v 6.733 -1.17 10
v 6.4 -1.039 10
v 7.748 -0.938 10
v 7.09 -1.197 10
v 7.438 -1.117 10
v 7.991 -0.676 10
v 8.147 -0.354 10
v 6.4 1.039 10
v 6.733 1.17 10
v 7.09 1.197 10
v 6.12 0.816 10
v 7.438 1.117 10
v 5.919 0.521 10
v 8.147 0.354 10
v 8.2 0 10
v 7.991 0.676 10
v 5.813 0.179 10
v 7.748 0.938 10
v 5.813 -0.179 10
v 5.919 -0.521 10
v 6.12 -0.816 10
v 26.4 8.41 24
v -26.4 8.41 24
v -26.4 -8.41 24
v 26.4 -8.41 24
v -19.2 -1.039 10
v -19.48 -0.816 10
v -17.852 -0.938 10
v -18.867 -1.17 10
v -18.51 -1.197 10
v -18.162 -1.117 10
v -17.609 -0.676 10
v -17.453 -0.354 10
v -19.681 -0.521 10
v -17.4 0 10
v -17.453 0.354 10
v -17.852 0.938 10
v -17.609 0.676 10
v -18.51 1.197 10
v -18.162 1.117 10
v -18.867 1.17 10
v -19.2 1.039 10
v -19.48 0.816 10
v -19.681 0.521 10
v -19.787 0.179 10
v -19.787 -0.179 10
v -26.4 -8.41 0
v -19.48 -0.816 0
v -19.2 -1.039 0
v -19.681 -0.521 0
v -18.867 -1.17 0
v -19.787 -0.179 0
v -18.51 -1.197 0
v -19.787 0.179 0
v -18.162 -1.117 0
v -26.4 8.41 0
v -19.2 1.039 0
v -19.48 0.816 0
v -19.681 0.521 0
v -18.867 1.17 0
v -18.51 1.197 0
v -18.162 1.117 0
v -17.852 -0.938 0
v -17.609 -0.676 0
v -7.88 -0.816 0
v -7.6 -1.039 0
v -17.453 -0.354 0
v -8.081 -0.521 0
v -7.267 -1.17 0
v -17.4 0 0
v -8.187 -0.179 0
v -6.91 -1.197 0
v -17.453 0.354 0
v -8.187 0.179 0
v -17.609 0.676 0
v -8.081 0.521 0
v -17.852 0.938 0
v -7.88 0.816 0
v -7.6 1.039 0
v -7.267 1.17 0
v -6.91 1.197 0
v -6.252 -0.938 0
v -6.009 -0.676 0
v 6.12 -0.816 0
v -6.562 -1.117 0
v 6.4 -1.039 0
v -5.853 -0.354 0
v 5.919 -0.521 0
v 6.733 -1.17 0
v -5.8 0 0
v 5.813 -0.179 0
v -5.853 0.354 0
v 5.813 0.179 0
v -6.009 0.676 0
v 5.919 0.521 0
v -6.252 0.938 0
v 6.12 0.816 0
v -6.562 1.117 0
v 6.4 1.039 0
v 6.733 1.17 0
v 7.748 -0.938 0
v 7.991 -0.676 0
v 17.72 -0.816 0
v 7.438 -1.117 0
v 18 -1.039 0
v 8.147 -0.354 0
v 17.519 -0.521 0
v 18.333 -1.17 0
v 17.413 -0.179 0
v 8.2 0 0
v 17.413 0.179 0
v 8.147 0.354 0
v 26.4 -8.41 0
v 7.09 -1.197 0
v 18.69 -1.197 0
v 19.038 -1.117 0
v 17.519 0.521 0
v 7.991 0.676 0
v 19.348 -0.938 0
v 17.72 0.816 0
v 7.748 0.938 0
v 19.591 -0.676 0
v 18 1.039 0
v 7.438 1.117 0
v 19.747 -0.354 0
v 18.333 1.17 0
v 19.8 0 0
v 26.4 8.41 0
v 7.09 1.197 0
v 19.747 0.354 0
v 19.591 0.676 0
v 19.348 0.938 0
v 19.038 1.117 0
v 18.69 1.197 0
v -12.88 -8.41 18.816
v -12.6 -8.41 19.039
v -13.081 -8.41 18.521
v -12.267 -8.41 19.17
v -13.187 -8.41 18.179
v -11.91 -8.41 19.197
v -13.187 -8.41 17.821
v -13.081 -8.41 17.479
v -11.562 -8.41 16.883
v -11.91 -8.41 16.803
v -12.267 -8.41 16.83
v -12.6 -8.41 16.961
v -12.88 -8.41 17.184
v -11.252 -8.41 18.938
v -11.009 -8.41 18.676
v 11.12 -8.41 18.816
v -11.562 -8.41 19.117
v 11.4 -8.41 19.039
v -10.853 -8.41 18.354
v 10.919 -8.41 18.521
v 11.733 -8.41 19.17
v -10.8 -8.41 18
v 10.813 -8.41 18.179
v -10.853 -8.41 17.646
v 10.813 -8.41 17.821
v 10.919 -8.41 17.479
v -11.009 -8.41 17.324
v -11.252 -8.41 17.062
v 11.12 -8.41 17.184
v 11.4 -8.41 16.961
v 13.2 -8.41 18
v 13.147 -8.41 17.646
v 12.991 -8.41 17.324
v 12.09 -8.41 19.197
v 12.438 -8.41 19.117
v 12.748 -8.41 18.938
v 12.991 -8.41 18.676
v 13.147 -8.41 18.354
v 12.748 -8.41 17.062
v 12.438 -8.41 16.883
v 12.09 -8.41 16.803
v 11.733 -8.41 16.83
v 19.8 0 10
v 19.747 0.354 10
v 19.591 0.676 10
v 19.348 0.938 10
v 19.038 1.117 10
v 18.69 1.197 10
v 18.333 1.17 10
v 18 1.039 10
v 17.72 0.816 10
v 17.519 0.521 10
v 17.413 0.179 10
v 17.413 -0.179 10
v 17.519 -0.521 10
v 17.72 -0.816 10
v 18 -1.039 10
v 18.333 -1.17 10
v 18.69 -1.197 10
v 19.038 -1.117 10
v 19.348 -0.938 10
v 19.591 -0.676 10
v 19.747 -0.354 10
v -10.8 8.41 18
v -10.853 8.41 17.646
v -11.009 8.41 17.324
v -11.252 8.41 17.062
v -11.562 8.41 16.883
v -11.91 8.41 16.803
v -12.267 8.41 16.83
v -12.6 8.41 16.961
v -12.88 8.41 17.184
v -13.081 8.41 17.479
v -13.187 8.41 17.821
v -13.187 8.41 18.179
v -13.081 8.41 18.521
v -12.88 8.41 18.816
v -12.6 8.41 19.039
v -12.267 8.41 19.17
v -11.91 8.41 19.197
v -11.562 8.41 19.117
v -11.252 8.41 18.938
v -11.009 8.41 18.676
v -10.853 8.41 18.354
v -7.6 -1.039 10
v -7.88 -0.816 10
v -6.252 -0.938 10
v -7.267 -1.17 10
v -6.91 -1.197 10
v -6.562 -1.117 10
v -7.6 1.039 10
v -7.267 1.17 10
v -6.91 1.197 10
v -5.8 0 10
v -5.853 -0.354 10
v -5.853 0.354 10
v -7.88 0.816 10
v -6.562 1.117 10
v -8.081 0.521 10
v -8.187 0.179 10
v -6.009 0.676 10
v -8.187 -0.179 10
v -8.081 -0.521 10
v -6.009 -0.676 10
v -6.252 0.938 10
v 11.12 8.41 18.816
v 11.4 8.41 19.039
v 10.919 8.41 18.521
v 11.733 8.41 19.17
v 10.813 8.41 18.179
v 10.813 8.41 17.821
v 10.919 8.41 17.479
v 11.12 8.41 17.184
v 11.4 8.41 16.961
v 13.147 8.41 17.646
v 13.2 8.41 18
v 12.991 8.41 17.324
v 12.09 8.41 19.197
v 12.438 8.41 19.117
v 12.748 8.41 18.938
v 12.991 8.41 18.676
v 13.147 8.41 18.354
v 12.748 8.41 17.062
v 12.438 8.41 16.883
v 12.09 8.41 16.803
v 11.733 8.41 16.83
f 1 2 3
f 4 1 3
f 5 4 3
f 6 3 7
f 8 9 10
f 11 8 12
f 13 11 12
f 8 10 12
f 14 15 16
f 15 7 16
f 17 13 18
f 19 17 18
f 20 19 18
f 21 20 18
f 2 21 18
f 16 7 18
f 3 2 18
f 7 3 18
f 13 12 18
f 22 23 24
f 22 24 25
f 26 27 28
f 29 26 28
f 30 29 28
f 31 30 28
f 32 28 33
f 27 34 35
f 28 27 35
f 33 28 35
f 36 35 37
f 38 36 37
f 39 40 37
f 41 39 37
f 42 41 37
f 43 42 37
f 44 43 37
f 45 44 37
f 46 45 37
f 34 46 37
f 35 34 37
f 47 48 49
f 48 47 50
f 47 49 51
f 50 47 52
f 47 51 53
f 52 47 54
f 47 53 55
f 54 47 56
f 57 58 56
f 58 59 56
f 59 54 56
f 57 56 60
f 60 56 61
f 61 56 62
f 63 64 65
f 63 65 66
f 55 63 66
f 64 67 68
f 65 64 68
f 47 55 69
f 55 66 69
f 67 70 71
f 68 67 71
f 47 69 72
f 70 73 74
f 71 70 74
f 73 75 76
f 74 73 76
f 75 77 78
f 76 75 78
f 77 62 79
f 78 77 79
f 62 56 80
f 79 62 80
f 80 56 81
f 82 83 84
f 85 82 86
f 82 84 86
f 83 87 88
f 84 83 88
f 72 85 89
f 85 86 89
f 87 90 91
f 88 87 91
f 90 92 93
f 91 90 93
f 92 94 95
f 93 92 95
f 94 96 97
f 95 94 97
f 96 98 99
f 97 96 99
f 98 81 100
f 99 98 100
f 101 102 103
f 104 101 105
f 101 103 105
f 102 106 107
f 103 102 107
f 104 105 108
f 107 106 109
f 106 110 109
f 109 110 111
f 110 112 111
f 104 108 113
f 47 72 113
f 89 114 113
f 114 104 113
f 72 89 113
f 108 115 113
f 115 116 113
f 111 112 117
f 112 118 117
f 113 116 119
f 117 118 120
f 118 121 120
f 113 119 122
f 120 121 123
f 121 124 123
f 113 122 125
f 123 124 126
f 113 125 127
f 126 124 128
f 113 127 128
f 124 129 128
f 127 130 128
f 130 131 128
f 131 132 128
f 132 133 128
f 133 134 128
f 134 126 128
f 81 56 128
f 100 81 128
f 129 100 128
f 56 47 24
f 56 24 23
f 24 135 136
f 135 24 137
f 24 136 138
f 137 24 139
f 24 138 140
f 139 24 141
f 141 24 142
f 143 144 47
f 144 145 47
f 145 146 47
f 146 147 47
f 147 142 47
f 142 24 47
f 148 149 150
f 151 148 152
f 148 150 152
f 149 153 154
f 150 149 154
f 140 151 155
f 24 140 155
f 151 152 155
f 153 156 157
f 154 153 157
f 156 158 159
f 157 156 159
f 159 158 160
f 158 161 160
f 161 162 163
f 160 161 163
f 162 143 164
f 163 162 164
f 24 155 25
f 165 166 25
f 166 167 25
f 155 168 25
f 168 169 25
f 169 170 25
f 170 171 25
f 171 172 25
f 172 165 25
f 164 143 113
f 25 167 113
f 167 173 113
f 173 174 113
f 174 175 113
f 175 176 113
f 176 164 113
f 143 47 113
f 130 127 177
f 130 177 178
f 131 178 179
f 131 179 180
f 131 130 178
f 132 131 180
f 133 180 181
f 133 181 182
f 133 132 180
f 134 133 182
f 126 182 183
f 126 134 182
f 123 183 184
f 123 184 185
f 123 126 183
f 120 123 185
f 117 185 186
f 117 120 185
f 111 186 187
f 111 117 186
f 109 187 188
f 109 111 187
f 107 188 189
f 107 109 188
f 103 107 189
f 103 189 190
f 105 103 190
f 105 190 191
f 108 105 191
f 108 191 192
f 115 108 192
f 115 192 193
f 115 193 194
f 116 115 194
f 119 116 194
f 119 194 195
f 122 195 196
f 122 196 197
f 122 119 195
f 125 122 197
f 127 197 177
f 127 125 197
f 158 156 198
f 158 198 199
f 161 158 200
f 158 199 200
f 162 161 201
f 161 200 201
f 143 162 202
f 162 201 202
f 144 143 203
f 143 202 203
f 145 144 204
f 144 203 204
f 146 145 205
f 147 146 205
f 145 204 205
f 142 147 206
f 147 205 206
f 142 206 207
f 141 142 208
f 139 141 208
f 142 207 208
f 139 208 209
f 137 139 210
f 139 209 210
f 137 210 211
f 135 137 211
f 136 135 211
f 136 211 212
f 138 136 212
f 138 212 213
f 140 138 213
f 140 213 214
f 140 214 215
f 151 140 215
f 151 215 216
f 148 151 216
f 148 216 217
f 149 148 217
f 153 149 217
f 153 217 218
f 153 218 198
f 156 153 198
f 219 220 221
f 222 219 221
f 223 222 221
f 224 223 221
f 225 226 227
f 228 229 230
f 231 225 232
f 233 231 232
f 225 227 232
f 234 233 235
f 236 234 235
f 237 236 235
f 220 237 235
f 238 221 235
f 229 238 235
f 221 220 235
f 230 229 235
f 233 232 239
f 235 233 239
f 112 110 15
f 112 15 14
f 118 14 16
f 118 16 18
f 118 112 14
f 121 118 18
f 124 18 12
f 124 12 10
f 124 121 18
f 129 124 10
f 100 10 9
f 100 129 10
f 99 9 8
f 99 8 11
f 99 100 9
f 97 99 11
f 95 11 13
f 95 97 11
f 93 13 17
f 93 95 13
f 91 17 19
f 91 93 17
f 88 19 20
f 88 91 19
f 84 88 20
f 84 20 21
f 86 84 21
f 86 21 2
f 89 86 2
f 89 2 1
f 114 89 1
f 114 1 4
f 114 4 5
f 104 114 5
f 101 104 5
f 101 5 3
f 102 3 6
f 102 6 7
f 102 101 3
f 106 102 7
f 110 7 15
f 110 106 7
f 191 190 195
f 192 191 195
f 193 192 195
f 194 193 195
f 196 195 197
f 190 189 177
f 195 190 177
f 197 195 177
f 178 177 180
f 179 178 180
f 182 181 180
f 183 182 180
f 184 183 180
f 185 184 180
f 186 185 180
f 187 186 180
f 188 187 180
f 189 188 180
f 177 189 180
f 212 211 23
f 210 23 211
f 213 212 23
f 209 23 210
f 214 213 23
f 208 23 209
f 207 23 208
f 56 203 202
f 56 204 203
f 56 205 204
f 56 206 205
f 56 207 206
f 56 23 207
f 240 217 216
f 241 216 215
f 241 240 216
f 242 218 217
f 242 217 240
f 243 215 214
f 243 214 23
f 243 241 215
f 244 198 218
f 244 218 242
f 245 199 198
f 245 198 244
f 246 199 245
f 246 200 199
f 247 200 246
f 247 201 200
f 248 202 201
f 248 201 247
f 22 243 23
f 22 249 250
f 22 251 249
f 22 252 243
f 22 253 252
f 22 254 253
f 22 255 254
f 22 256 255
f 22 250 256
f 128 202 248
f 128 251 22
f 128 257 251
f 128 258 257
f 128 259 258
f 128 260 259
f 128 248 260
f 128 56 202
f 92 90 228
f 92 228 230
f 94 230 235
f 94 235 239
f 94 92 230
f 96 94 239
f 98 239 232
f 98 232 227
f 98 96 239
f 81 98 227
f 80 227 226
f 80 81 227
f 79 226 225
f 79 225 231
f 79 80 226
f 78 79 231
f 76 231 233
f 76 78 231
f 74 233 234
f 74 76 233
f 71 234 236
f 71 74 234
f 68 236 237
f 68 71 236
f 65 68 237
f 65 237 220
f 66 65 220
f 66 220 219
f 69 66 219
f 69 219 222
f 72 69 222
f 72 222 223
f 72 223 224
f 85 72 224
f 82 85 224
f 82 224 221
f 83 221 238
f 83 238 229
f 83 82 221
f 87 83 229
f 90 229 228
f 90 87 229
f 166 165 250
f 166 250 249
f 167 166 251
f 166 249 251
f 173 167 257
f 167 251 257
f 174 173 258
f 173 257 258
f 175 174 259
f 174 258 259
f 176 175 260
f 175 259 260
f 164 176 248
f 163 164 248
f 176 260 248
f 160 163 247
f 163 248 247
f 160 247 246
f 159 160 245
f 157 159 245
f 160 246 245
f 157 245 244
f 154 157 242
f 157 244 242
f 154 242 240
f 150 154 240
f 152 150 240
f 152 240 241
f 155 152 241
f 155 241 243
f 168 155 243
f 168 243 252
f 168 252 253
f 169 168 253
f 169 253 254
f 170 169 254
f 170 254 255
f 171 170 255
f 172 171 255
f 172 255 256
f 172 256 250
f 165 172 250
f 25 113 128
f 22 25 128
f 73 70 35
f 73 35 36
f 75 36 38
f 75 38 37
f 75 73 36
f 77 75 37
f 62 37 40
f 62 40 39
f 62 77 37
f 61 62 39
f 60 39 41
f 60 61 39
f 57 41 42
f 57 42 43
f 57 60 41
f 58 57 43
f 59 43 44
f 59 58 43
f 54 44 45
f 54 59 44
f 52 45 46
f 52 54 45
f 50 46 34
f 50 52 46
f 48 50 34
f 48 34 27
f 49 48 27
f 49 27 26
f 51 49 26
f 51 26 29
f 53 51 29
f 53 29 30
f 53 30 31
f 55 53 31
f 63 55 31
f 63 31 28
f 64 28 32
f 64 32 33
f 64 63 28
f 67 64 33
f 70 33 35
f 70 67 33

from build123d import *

# Parameters (mm, degrees)
CROQUIS1_W              = 52.8
CROQUIS1_H              = 16.82
SALIENTE_EXTRUIR1_DEPTH = 30
CROQUIS2_R              = 1.2
CORTAR_EXTRUIR1_DEPTH   = 20
CROQUIS3_R              = 1.2
CORTAR_EXTRUIR2_DEPTH   = 10
CROQUIS4_W              = 52.8
CROQUIS4_H              = 16.82
CORTAR_EXTRUIR3_DEPTH   = 6


with BuildPart() as part:
    # Croquis1 → Saliente-Extruir1 (new body)
    with BuildSketch(Plane.XY):
        Rectangle(CROQUIS1_W, CROQUIS1_H)
    extrude(amount=SALIENTE_EXTRUIR1_DEPTH)

    # Croquis2 → Cortar-Extruir1 (cut)
    with BuildSketch(Plane(origin=(0, 8.41, 0), x_dir=(1, 0, 0), z_dir=(0, 1, 0))):
        with Locations((-12, -18)):
            Circle(CROQUIS2_R)
        with Locations((12, -18)):
            Circle(CROQUIS2_R)
    extrude(amount=-CORTAR_EXTRUIR1_DEPTH, mode=Mode.SUBTRACT)

    # Croquis3 → Cortar-Extruir2 (cut)
    with BuildSketch(Plane.XY):
        with Locations((18.6, 0)):
            Circle(CROQUIS3_R)
        with Locations((7, 0)):
            Circle(CROQUIS3_R)
        with Locations((-7, 0)):
            Circle(CROQUIS3_R)
        with Locations((-18.6, 0)):
            Circle(CROQUIS3_R)
    extrude(amount=CORTAR_EXTRUIR2_DEPTH, mode=Mode.SUBTRACT)

    # Croquis4 → Cortar-Extruir3 (cut)
    with BuildSketch(Plane.XY.offset(30)):
        Rectangle(CROQUIS4_W, CROQUIS4_H)
    extrude(amount=-CORTAR_EXTRUIR3_DEPTH, mode=Mode.SUBTRACT)


solid = part.part
